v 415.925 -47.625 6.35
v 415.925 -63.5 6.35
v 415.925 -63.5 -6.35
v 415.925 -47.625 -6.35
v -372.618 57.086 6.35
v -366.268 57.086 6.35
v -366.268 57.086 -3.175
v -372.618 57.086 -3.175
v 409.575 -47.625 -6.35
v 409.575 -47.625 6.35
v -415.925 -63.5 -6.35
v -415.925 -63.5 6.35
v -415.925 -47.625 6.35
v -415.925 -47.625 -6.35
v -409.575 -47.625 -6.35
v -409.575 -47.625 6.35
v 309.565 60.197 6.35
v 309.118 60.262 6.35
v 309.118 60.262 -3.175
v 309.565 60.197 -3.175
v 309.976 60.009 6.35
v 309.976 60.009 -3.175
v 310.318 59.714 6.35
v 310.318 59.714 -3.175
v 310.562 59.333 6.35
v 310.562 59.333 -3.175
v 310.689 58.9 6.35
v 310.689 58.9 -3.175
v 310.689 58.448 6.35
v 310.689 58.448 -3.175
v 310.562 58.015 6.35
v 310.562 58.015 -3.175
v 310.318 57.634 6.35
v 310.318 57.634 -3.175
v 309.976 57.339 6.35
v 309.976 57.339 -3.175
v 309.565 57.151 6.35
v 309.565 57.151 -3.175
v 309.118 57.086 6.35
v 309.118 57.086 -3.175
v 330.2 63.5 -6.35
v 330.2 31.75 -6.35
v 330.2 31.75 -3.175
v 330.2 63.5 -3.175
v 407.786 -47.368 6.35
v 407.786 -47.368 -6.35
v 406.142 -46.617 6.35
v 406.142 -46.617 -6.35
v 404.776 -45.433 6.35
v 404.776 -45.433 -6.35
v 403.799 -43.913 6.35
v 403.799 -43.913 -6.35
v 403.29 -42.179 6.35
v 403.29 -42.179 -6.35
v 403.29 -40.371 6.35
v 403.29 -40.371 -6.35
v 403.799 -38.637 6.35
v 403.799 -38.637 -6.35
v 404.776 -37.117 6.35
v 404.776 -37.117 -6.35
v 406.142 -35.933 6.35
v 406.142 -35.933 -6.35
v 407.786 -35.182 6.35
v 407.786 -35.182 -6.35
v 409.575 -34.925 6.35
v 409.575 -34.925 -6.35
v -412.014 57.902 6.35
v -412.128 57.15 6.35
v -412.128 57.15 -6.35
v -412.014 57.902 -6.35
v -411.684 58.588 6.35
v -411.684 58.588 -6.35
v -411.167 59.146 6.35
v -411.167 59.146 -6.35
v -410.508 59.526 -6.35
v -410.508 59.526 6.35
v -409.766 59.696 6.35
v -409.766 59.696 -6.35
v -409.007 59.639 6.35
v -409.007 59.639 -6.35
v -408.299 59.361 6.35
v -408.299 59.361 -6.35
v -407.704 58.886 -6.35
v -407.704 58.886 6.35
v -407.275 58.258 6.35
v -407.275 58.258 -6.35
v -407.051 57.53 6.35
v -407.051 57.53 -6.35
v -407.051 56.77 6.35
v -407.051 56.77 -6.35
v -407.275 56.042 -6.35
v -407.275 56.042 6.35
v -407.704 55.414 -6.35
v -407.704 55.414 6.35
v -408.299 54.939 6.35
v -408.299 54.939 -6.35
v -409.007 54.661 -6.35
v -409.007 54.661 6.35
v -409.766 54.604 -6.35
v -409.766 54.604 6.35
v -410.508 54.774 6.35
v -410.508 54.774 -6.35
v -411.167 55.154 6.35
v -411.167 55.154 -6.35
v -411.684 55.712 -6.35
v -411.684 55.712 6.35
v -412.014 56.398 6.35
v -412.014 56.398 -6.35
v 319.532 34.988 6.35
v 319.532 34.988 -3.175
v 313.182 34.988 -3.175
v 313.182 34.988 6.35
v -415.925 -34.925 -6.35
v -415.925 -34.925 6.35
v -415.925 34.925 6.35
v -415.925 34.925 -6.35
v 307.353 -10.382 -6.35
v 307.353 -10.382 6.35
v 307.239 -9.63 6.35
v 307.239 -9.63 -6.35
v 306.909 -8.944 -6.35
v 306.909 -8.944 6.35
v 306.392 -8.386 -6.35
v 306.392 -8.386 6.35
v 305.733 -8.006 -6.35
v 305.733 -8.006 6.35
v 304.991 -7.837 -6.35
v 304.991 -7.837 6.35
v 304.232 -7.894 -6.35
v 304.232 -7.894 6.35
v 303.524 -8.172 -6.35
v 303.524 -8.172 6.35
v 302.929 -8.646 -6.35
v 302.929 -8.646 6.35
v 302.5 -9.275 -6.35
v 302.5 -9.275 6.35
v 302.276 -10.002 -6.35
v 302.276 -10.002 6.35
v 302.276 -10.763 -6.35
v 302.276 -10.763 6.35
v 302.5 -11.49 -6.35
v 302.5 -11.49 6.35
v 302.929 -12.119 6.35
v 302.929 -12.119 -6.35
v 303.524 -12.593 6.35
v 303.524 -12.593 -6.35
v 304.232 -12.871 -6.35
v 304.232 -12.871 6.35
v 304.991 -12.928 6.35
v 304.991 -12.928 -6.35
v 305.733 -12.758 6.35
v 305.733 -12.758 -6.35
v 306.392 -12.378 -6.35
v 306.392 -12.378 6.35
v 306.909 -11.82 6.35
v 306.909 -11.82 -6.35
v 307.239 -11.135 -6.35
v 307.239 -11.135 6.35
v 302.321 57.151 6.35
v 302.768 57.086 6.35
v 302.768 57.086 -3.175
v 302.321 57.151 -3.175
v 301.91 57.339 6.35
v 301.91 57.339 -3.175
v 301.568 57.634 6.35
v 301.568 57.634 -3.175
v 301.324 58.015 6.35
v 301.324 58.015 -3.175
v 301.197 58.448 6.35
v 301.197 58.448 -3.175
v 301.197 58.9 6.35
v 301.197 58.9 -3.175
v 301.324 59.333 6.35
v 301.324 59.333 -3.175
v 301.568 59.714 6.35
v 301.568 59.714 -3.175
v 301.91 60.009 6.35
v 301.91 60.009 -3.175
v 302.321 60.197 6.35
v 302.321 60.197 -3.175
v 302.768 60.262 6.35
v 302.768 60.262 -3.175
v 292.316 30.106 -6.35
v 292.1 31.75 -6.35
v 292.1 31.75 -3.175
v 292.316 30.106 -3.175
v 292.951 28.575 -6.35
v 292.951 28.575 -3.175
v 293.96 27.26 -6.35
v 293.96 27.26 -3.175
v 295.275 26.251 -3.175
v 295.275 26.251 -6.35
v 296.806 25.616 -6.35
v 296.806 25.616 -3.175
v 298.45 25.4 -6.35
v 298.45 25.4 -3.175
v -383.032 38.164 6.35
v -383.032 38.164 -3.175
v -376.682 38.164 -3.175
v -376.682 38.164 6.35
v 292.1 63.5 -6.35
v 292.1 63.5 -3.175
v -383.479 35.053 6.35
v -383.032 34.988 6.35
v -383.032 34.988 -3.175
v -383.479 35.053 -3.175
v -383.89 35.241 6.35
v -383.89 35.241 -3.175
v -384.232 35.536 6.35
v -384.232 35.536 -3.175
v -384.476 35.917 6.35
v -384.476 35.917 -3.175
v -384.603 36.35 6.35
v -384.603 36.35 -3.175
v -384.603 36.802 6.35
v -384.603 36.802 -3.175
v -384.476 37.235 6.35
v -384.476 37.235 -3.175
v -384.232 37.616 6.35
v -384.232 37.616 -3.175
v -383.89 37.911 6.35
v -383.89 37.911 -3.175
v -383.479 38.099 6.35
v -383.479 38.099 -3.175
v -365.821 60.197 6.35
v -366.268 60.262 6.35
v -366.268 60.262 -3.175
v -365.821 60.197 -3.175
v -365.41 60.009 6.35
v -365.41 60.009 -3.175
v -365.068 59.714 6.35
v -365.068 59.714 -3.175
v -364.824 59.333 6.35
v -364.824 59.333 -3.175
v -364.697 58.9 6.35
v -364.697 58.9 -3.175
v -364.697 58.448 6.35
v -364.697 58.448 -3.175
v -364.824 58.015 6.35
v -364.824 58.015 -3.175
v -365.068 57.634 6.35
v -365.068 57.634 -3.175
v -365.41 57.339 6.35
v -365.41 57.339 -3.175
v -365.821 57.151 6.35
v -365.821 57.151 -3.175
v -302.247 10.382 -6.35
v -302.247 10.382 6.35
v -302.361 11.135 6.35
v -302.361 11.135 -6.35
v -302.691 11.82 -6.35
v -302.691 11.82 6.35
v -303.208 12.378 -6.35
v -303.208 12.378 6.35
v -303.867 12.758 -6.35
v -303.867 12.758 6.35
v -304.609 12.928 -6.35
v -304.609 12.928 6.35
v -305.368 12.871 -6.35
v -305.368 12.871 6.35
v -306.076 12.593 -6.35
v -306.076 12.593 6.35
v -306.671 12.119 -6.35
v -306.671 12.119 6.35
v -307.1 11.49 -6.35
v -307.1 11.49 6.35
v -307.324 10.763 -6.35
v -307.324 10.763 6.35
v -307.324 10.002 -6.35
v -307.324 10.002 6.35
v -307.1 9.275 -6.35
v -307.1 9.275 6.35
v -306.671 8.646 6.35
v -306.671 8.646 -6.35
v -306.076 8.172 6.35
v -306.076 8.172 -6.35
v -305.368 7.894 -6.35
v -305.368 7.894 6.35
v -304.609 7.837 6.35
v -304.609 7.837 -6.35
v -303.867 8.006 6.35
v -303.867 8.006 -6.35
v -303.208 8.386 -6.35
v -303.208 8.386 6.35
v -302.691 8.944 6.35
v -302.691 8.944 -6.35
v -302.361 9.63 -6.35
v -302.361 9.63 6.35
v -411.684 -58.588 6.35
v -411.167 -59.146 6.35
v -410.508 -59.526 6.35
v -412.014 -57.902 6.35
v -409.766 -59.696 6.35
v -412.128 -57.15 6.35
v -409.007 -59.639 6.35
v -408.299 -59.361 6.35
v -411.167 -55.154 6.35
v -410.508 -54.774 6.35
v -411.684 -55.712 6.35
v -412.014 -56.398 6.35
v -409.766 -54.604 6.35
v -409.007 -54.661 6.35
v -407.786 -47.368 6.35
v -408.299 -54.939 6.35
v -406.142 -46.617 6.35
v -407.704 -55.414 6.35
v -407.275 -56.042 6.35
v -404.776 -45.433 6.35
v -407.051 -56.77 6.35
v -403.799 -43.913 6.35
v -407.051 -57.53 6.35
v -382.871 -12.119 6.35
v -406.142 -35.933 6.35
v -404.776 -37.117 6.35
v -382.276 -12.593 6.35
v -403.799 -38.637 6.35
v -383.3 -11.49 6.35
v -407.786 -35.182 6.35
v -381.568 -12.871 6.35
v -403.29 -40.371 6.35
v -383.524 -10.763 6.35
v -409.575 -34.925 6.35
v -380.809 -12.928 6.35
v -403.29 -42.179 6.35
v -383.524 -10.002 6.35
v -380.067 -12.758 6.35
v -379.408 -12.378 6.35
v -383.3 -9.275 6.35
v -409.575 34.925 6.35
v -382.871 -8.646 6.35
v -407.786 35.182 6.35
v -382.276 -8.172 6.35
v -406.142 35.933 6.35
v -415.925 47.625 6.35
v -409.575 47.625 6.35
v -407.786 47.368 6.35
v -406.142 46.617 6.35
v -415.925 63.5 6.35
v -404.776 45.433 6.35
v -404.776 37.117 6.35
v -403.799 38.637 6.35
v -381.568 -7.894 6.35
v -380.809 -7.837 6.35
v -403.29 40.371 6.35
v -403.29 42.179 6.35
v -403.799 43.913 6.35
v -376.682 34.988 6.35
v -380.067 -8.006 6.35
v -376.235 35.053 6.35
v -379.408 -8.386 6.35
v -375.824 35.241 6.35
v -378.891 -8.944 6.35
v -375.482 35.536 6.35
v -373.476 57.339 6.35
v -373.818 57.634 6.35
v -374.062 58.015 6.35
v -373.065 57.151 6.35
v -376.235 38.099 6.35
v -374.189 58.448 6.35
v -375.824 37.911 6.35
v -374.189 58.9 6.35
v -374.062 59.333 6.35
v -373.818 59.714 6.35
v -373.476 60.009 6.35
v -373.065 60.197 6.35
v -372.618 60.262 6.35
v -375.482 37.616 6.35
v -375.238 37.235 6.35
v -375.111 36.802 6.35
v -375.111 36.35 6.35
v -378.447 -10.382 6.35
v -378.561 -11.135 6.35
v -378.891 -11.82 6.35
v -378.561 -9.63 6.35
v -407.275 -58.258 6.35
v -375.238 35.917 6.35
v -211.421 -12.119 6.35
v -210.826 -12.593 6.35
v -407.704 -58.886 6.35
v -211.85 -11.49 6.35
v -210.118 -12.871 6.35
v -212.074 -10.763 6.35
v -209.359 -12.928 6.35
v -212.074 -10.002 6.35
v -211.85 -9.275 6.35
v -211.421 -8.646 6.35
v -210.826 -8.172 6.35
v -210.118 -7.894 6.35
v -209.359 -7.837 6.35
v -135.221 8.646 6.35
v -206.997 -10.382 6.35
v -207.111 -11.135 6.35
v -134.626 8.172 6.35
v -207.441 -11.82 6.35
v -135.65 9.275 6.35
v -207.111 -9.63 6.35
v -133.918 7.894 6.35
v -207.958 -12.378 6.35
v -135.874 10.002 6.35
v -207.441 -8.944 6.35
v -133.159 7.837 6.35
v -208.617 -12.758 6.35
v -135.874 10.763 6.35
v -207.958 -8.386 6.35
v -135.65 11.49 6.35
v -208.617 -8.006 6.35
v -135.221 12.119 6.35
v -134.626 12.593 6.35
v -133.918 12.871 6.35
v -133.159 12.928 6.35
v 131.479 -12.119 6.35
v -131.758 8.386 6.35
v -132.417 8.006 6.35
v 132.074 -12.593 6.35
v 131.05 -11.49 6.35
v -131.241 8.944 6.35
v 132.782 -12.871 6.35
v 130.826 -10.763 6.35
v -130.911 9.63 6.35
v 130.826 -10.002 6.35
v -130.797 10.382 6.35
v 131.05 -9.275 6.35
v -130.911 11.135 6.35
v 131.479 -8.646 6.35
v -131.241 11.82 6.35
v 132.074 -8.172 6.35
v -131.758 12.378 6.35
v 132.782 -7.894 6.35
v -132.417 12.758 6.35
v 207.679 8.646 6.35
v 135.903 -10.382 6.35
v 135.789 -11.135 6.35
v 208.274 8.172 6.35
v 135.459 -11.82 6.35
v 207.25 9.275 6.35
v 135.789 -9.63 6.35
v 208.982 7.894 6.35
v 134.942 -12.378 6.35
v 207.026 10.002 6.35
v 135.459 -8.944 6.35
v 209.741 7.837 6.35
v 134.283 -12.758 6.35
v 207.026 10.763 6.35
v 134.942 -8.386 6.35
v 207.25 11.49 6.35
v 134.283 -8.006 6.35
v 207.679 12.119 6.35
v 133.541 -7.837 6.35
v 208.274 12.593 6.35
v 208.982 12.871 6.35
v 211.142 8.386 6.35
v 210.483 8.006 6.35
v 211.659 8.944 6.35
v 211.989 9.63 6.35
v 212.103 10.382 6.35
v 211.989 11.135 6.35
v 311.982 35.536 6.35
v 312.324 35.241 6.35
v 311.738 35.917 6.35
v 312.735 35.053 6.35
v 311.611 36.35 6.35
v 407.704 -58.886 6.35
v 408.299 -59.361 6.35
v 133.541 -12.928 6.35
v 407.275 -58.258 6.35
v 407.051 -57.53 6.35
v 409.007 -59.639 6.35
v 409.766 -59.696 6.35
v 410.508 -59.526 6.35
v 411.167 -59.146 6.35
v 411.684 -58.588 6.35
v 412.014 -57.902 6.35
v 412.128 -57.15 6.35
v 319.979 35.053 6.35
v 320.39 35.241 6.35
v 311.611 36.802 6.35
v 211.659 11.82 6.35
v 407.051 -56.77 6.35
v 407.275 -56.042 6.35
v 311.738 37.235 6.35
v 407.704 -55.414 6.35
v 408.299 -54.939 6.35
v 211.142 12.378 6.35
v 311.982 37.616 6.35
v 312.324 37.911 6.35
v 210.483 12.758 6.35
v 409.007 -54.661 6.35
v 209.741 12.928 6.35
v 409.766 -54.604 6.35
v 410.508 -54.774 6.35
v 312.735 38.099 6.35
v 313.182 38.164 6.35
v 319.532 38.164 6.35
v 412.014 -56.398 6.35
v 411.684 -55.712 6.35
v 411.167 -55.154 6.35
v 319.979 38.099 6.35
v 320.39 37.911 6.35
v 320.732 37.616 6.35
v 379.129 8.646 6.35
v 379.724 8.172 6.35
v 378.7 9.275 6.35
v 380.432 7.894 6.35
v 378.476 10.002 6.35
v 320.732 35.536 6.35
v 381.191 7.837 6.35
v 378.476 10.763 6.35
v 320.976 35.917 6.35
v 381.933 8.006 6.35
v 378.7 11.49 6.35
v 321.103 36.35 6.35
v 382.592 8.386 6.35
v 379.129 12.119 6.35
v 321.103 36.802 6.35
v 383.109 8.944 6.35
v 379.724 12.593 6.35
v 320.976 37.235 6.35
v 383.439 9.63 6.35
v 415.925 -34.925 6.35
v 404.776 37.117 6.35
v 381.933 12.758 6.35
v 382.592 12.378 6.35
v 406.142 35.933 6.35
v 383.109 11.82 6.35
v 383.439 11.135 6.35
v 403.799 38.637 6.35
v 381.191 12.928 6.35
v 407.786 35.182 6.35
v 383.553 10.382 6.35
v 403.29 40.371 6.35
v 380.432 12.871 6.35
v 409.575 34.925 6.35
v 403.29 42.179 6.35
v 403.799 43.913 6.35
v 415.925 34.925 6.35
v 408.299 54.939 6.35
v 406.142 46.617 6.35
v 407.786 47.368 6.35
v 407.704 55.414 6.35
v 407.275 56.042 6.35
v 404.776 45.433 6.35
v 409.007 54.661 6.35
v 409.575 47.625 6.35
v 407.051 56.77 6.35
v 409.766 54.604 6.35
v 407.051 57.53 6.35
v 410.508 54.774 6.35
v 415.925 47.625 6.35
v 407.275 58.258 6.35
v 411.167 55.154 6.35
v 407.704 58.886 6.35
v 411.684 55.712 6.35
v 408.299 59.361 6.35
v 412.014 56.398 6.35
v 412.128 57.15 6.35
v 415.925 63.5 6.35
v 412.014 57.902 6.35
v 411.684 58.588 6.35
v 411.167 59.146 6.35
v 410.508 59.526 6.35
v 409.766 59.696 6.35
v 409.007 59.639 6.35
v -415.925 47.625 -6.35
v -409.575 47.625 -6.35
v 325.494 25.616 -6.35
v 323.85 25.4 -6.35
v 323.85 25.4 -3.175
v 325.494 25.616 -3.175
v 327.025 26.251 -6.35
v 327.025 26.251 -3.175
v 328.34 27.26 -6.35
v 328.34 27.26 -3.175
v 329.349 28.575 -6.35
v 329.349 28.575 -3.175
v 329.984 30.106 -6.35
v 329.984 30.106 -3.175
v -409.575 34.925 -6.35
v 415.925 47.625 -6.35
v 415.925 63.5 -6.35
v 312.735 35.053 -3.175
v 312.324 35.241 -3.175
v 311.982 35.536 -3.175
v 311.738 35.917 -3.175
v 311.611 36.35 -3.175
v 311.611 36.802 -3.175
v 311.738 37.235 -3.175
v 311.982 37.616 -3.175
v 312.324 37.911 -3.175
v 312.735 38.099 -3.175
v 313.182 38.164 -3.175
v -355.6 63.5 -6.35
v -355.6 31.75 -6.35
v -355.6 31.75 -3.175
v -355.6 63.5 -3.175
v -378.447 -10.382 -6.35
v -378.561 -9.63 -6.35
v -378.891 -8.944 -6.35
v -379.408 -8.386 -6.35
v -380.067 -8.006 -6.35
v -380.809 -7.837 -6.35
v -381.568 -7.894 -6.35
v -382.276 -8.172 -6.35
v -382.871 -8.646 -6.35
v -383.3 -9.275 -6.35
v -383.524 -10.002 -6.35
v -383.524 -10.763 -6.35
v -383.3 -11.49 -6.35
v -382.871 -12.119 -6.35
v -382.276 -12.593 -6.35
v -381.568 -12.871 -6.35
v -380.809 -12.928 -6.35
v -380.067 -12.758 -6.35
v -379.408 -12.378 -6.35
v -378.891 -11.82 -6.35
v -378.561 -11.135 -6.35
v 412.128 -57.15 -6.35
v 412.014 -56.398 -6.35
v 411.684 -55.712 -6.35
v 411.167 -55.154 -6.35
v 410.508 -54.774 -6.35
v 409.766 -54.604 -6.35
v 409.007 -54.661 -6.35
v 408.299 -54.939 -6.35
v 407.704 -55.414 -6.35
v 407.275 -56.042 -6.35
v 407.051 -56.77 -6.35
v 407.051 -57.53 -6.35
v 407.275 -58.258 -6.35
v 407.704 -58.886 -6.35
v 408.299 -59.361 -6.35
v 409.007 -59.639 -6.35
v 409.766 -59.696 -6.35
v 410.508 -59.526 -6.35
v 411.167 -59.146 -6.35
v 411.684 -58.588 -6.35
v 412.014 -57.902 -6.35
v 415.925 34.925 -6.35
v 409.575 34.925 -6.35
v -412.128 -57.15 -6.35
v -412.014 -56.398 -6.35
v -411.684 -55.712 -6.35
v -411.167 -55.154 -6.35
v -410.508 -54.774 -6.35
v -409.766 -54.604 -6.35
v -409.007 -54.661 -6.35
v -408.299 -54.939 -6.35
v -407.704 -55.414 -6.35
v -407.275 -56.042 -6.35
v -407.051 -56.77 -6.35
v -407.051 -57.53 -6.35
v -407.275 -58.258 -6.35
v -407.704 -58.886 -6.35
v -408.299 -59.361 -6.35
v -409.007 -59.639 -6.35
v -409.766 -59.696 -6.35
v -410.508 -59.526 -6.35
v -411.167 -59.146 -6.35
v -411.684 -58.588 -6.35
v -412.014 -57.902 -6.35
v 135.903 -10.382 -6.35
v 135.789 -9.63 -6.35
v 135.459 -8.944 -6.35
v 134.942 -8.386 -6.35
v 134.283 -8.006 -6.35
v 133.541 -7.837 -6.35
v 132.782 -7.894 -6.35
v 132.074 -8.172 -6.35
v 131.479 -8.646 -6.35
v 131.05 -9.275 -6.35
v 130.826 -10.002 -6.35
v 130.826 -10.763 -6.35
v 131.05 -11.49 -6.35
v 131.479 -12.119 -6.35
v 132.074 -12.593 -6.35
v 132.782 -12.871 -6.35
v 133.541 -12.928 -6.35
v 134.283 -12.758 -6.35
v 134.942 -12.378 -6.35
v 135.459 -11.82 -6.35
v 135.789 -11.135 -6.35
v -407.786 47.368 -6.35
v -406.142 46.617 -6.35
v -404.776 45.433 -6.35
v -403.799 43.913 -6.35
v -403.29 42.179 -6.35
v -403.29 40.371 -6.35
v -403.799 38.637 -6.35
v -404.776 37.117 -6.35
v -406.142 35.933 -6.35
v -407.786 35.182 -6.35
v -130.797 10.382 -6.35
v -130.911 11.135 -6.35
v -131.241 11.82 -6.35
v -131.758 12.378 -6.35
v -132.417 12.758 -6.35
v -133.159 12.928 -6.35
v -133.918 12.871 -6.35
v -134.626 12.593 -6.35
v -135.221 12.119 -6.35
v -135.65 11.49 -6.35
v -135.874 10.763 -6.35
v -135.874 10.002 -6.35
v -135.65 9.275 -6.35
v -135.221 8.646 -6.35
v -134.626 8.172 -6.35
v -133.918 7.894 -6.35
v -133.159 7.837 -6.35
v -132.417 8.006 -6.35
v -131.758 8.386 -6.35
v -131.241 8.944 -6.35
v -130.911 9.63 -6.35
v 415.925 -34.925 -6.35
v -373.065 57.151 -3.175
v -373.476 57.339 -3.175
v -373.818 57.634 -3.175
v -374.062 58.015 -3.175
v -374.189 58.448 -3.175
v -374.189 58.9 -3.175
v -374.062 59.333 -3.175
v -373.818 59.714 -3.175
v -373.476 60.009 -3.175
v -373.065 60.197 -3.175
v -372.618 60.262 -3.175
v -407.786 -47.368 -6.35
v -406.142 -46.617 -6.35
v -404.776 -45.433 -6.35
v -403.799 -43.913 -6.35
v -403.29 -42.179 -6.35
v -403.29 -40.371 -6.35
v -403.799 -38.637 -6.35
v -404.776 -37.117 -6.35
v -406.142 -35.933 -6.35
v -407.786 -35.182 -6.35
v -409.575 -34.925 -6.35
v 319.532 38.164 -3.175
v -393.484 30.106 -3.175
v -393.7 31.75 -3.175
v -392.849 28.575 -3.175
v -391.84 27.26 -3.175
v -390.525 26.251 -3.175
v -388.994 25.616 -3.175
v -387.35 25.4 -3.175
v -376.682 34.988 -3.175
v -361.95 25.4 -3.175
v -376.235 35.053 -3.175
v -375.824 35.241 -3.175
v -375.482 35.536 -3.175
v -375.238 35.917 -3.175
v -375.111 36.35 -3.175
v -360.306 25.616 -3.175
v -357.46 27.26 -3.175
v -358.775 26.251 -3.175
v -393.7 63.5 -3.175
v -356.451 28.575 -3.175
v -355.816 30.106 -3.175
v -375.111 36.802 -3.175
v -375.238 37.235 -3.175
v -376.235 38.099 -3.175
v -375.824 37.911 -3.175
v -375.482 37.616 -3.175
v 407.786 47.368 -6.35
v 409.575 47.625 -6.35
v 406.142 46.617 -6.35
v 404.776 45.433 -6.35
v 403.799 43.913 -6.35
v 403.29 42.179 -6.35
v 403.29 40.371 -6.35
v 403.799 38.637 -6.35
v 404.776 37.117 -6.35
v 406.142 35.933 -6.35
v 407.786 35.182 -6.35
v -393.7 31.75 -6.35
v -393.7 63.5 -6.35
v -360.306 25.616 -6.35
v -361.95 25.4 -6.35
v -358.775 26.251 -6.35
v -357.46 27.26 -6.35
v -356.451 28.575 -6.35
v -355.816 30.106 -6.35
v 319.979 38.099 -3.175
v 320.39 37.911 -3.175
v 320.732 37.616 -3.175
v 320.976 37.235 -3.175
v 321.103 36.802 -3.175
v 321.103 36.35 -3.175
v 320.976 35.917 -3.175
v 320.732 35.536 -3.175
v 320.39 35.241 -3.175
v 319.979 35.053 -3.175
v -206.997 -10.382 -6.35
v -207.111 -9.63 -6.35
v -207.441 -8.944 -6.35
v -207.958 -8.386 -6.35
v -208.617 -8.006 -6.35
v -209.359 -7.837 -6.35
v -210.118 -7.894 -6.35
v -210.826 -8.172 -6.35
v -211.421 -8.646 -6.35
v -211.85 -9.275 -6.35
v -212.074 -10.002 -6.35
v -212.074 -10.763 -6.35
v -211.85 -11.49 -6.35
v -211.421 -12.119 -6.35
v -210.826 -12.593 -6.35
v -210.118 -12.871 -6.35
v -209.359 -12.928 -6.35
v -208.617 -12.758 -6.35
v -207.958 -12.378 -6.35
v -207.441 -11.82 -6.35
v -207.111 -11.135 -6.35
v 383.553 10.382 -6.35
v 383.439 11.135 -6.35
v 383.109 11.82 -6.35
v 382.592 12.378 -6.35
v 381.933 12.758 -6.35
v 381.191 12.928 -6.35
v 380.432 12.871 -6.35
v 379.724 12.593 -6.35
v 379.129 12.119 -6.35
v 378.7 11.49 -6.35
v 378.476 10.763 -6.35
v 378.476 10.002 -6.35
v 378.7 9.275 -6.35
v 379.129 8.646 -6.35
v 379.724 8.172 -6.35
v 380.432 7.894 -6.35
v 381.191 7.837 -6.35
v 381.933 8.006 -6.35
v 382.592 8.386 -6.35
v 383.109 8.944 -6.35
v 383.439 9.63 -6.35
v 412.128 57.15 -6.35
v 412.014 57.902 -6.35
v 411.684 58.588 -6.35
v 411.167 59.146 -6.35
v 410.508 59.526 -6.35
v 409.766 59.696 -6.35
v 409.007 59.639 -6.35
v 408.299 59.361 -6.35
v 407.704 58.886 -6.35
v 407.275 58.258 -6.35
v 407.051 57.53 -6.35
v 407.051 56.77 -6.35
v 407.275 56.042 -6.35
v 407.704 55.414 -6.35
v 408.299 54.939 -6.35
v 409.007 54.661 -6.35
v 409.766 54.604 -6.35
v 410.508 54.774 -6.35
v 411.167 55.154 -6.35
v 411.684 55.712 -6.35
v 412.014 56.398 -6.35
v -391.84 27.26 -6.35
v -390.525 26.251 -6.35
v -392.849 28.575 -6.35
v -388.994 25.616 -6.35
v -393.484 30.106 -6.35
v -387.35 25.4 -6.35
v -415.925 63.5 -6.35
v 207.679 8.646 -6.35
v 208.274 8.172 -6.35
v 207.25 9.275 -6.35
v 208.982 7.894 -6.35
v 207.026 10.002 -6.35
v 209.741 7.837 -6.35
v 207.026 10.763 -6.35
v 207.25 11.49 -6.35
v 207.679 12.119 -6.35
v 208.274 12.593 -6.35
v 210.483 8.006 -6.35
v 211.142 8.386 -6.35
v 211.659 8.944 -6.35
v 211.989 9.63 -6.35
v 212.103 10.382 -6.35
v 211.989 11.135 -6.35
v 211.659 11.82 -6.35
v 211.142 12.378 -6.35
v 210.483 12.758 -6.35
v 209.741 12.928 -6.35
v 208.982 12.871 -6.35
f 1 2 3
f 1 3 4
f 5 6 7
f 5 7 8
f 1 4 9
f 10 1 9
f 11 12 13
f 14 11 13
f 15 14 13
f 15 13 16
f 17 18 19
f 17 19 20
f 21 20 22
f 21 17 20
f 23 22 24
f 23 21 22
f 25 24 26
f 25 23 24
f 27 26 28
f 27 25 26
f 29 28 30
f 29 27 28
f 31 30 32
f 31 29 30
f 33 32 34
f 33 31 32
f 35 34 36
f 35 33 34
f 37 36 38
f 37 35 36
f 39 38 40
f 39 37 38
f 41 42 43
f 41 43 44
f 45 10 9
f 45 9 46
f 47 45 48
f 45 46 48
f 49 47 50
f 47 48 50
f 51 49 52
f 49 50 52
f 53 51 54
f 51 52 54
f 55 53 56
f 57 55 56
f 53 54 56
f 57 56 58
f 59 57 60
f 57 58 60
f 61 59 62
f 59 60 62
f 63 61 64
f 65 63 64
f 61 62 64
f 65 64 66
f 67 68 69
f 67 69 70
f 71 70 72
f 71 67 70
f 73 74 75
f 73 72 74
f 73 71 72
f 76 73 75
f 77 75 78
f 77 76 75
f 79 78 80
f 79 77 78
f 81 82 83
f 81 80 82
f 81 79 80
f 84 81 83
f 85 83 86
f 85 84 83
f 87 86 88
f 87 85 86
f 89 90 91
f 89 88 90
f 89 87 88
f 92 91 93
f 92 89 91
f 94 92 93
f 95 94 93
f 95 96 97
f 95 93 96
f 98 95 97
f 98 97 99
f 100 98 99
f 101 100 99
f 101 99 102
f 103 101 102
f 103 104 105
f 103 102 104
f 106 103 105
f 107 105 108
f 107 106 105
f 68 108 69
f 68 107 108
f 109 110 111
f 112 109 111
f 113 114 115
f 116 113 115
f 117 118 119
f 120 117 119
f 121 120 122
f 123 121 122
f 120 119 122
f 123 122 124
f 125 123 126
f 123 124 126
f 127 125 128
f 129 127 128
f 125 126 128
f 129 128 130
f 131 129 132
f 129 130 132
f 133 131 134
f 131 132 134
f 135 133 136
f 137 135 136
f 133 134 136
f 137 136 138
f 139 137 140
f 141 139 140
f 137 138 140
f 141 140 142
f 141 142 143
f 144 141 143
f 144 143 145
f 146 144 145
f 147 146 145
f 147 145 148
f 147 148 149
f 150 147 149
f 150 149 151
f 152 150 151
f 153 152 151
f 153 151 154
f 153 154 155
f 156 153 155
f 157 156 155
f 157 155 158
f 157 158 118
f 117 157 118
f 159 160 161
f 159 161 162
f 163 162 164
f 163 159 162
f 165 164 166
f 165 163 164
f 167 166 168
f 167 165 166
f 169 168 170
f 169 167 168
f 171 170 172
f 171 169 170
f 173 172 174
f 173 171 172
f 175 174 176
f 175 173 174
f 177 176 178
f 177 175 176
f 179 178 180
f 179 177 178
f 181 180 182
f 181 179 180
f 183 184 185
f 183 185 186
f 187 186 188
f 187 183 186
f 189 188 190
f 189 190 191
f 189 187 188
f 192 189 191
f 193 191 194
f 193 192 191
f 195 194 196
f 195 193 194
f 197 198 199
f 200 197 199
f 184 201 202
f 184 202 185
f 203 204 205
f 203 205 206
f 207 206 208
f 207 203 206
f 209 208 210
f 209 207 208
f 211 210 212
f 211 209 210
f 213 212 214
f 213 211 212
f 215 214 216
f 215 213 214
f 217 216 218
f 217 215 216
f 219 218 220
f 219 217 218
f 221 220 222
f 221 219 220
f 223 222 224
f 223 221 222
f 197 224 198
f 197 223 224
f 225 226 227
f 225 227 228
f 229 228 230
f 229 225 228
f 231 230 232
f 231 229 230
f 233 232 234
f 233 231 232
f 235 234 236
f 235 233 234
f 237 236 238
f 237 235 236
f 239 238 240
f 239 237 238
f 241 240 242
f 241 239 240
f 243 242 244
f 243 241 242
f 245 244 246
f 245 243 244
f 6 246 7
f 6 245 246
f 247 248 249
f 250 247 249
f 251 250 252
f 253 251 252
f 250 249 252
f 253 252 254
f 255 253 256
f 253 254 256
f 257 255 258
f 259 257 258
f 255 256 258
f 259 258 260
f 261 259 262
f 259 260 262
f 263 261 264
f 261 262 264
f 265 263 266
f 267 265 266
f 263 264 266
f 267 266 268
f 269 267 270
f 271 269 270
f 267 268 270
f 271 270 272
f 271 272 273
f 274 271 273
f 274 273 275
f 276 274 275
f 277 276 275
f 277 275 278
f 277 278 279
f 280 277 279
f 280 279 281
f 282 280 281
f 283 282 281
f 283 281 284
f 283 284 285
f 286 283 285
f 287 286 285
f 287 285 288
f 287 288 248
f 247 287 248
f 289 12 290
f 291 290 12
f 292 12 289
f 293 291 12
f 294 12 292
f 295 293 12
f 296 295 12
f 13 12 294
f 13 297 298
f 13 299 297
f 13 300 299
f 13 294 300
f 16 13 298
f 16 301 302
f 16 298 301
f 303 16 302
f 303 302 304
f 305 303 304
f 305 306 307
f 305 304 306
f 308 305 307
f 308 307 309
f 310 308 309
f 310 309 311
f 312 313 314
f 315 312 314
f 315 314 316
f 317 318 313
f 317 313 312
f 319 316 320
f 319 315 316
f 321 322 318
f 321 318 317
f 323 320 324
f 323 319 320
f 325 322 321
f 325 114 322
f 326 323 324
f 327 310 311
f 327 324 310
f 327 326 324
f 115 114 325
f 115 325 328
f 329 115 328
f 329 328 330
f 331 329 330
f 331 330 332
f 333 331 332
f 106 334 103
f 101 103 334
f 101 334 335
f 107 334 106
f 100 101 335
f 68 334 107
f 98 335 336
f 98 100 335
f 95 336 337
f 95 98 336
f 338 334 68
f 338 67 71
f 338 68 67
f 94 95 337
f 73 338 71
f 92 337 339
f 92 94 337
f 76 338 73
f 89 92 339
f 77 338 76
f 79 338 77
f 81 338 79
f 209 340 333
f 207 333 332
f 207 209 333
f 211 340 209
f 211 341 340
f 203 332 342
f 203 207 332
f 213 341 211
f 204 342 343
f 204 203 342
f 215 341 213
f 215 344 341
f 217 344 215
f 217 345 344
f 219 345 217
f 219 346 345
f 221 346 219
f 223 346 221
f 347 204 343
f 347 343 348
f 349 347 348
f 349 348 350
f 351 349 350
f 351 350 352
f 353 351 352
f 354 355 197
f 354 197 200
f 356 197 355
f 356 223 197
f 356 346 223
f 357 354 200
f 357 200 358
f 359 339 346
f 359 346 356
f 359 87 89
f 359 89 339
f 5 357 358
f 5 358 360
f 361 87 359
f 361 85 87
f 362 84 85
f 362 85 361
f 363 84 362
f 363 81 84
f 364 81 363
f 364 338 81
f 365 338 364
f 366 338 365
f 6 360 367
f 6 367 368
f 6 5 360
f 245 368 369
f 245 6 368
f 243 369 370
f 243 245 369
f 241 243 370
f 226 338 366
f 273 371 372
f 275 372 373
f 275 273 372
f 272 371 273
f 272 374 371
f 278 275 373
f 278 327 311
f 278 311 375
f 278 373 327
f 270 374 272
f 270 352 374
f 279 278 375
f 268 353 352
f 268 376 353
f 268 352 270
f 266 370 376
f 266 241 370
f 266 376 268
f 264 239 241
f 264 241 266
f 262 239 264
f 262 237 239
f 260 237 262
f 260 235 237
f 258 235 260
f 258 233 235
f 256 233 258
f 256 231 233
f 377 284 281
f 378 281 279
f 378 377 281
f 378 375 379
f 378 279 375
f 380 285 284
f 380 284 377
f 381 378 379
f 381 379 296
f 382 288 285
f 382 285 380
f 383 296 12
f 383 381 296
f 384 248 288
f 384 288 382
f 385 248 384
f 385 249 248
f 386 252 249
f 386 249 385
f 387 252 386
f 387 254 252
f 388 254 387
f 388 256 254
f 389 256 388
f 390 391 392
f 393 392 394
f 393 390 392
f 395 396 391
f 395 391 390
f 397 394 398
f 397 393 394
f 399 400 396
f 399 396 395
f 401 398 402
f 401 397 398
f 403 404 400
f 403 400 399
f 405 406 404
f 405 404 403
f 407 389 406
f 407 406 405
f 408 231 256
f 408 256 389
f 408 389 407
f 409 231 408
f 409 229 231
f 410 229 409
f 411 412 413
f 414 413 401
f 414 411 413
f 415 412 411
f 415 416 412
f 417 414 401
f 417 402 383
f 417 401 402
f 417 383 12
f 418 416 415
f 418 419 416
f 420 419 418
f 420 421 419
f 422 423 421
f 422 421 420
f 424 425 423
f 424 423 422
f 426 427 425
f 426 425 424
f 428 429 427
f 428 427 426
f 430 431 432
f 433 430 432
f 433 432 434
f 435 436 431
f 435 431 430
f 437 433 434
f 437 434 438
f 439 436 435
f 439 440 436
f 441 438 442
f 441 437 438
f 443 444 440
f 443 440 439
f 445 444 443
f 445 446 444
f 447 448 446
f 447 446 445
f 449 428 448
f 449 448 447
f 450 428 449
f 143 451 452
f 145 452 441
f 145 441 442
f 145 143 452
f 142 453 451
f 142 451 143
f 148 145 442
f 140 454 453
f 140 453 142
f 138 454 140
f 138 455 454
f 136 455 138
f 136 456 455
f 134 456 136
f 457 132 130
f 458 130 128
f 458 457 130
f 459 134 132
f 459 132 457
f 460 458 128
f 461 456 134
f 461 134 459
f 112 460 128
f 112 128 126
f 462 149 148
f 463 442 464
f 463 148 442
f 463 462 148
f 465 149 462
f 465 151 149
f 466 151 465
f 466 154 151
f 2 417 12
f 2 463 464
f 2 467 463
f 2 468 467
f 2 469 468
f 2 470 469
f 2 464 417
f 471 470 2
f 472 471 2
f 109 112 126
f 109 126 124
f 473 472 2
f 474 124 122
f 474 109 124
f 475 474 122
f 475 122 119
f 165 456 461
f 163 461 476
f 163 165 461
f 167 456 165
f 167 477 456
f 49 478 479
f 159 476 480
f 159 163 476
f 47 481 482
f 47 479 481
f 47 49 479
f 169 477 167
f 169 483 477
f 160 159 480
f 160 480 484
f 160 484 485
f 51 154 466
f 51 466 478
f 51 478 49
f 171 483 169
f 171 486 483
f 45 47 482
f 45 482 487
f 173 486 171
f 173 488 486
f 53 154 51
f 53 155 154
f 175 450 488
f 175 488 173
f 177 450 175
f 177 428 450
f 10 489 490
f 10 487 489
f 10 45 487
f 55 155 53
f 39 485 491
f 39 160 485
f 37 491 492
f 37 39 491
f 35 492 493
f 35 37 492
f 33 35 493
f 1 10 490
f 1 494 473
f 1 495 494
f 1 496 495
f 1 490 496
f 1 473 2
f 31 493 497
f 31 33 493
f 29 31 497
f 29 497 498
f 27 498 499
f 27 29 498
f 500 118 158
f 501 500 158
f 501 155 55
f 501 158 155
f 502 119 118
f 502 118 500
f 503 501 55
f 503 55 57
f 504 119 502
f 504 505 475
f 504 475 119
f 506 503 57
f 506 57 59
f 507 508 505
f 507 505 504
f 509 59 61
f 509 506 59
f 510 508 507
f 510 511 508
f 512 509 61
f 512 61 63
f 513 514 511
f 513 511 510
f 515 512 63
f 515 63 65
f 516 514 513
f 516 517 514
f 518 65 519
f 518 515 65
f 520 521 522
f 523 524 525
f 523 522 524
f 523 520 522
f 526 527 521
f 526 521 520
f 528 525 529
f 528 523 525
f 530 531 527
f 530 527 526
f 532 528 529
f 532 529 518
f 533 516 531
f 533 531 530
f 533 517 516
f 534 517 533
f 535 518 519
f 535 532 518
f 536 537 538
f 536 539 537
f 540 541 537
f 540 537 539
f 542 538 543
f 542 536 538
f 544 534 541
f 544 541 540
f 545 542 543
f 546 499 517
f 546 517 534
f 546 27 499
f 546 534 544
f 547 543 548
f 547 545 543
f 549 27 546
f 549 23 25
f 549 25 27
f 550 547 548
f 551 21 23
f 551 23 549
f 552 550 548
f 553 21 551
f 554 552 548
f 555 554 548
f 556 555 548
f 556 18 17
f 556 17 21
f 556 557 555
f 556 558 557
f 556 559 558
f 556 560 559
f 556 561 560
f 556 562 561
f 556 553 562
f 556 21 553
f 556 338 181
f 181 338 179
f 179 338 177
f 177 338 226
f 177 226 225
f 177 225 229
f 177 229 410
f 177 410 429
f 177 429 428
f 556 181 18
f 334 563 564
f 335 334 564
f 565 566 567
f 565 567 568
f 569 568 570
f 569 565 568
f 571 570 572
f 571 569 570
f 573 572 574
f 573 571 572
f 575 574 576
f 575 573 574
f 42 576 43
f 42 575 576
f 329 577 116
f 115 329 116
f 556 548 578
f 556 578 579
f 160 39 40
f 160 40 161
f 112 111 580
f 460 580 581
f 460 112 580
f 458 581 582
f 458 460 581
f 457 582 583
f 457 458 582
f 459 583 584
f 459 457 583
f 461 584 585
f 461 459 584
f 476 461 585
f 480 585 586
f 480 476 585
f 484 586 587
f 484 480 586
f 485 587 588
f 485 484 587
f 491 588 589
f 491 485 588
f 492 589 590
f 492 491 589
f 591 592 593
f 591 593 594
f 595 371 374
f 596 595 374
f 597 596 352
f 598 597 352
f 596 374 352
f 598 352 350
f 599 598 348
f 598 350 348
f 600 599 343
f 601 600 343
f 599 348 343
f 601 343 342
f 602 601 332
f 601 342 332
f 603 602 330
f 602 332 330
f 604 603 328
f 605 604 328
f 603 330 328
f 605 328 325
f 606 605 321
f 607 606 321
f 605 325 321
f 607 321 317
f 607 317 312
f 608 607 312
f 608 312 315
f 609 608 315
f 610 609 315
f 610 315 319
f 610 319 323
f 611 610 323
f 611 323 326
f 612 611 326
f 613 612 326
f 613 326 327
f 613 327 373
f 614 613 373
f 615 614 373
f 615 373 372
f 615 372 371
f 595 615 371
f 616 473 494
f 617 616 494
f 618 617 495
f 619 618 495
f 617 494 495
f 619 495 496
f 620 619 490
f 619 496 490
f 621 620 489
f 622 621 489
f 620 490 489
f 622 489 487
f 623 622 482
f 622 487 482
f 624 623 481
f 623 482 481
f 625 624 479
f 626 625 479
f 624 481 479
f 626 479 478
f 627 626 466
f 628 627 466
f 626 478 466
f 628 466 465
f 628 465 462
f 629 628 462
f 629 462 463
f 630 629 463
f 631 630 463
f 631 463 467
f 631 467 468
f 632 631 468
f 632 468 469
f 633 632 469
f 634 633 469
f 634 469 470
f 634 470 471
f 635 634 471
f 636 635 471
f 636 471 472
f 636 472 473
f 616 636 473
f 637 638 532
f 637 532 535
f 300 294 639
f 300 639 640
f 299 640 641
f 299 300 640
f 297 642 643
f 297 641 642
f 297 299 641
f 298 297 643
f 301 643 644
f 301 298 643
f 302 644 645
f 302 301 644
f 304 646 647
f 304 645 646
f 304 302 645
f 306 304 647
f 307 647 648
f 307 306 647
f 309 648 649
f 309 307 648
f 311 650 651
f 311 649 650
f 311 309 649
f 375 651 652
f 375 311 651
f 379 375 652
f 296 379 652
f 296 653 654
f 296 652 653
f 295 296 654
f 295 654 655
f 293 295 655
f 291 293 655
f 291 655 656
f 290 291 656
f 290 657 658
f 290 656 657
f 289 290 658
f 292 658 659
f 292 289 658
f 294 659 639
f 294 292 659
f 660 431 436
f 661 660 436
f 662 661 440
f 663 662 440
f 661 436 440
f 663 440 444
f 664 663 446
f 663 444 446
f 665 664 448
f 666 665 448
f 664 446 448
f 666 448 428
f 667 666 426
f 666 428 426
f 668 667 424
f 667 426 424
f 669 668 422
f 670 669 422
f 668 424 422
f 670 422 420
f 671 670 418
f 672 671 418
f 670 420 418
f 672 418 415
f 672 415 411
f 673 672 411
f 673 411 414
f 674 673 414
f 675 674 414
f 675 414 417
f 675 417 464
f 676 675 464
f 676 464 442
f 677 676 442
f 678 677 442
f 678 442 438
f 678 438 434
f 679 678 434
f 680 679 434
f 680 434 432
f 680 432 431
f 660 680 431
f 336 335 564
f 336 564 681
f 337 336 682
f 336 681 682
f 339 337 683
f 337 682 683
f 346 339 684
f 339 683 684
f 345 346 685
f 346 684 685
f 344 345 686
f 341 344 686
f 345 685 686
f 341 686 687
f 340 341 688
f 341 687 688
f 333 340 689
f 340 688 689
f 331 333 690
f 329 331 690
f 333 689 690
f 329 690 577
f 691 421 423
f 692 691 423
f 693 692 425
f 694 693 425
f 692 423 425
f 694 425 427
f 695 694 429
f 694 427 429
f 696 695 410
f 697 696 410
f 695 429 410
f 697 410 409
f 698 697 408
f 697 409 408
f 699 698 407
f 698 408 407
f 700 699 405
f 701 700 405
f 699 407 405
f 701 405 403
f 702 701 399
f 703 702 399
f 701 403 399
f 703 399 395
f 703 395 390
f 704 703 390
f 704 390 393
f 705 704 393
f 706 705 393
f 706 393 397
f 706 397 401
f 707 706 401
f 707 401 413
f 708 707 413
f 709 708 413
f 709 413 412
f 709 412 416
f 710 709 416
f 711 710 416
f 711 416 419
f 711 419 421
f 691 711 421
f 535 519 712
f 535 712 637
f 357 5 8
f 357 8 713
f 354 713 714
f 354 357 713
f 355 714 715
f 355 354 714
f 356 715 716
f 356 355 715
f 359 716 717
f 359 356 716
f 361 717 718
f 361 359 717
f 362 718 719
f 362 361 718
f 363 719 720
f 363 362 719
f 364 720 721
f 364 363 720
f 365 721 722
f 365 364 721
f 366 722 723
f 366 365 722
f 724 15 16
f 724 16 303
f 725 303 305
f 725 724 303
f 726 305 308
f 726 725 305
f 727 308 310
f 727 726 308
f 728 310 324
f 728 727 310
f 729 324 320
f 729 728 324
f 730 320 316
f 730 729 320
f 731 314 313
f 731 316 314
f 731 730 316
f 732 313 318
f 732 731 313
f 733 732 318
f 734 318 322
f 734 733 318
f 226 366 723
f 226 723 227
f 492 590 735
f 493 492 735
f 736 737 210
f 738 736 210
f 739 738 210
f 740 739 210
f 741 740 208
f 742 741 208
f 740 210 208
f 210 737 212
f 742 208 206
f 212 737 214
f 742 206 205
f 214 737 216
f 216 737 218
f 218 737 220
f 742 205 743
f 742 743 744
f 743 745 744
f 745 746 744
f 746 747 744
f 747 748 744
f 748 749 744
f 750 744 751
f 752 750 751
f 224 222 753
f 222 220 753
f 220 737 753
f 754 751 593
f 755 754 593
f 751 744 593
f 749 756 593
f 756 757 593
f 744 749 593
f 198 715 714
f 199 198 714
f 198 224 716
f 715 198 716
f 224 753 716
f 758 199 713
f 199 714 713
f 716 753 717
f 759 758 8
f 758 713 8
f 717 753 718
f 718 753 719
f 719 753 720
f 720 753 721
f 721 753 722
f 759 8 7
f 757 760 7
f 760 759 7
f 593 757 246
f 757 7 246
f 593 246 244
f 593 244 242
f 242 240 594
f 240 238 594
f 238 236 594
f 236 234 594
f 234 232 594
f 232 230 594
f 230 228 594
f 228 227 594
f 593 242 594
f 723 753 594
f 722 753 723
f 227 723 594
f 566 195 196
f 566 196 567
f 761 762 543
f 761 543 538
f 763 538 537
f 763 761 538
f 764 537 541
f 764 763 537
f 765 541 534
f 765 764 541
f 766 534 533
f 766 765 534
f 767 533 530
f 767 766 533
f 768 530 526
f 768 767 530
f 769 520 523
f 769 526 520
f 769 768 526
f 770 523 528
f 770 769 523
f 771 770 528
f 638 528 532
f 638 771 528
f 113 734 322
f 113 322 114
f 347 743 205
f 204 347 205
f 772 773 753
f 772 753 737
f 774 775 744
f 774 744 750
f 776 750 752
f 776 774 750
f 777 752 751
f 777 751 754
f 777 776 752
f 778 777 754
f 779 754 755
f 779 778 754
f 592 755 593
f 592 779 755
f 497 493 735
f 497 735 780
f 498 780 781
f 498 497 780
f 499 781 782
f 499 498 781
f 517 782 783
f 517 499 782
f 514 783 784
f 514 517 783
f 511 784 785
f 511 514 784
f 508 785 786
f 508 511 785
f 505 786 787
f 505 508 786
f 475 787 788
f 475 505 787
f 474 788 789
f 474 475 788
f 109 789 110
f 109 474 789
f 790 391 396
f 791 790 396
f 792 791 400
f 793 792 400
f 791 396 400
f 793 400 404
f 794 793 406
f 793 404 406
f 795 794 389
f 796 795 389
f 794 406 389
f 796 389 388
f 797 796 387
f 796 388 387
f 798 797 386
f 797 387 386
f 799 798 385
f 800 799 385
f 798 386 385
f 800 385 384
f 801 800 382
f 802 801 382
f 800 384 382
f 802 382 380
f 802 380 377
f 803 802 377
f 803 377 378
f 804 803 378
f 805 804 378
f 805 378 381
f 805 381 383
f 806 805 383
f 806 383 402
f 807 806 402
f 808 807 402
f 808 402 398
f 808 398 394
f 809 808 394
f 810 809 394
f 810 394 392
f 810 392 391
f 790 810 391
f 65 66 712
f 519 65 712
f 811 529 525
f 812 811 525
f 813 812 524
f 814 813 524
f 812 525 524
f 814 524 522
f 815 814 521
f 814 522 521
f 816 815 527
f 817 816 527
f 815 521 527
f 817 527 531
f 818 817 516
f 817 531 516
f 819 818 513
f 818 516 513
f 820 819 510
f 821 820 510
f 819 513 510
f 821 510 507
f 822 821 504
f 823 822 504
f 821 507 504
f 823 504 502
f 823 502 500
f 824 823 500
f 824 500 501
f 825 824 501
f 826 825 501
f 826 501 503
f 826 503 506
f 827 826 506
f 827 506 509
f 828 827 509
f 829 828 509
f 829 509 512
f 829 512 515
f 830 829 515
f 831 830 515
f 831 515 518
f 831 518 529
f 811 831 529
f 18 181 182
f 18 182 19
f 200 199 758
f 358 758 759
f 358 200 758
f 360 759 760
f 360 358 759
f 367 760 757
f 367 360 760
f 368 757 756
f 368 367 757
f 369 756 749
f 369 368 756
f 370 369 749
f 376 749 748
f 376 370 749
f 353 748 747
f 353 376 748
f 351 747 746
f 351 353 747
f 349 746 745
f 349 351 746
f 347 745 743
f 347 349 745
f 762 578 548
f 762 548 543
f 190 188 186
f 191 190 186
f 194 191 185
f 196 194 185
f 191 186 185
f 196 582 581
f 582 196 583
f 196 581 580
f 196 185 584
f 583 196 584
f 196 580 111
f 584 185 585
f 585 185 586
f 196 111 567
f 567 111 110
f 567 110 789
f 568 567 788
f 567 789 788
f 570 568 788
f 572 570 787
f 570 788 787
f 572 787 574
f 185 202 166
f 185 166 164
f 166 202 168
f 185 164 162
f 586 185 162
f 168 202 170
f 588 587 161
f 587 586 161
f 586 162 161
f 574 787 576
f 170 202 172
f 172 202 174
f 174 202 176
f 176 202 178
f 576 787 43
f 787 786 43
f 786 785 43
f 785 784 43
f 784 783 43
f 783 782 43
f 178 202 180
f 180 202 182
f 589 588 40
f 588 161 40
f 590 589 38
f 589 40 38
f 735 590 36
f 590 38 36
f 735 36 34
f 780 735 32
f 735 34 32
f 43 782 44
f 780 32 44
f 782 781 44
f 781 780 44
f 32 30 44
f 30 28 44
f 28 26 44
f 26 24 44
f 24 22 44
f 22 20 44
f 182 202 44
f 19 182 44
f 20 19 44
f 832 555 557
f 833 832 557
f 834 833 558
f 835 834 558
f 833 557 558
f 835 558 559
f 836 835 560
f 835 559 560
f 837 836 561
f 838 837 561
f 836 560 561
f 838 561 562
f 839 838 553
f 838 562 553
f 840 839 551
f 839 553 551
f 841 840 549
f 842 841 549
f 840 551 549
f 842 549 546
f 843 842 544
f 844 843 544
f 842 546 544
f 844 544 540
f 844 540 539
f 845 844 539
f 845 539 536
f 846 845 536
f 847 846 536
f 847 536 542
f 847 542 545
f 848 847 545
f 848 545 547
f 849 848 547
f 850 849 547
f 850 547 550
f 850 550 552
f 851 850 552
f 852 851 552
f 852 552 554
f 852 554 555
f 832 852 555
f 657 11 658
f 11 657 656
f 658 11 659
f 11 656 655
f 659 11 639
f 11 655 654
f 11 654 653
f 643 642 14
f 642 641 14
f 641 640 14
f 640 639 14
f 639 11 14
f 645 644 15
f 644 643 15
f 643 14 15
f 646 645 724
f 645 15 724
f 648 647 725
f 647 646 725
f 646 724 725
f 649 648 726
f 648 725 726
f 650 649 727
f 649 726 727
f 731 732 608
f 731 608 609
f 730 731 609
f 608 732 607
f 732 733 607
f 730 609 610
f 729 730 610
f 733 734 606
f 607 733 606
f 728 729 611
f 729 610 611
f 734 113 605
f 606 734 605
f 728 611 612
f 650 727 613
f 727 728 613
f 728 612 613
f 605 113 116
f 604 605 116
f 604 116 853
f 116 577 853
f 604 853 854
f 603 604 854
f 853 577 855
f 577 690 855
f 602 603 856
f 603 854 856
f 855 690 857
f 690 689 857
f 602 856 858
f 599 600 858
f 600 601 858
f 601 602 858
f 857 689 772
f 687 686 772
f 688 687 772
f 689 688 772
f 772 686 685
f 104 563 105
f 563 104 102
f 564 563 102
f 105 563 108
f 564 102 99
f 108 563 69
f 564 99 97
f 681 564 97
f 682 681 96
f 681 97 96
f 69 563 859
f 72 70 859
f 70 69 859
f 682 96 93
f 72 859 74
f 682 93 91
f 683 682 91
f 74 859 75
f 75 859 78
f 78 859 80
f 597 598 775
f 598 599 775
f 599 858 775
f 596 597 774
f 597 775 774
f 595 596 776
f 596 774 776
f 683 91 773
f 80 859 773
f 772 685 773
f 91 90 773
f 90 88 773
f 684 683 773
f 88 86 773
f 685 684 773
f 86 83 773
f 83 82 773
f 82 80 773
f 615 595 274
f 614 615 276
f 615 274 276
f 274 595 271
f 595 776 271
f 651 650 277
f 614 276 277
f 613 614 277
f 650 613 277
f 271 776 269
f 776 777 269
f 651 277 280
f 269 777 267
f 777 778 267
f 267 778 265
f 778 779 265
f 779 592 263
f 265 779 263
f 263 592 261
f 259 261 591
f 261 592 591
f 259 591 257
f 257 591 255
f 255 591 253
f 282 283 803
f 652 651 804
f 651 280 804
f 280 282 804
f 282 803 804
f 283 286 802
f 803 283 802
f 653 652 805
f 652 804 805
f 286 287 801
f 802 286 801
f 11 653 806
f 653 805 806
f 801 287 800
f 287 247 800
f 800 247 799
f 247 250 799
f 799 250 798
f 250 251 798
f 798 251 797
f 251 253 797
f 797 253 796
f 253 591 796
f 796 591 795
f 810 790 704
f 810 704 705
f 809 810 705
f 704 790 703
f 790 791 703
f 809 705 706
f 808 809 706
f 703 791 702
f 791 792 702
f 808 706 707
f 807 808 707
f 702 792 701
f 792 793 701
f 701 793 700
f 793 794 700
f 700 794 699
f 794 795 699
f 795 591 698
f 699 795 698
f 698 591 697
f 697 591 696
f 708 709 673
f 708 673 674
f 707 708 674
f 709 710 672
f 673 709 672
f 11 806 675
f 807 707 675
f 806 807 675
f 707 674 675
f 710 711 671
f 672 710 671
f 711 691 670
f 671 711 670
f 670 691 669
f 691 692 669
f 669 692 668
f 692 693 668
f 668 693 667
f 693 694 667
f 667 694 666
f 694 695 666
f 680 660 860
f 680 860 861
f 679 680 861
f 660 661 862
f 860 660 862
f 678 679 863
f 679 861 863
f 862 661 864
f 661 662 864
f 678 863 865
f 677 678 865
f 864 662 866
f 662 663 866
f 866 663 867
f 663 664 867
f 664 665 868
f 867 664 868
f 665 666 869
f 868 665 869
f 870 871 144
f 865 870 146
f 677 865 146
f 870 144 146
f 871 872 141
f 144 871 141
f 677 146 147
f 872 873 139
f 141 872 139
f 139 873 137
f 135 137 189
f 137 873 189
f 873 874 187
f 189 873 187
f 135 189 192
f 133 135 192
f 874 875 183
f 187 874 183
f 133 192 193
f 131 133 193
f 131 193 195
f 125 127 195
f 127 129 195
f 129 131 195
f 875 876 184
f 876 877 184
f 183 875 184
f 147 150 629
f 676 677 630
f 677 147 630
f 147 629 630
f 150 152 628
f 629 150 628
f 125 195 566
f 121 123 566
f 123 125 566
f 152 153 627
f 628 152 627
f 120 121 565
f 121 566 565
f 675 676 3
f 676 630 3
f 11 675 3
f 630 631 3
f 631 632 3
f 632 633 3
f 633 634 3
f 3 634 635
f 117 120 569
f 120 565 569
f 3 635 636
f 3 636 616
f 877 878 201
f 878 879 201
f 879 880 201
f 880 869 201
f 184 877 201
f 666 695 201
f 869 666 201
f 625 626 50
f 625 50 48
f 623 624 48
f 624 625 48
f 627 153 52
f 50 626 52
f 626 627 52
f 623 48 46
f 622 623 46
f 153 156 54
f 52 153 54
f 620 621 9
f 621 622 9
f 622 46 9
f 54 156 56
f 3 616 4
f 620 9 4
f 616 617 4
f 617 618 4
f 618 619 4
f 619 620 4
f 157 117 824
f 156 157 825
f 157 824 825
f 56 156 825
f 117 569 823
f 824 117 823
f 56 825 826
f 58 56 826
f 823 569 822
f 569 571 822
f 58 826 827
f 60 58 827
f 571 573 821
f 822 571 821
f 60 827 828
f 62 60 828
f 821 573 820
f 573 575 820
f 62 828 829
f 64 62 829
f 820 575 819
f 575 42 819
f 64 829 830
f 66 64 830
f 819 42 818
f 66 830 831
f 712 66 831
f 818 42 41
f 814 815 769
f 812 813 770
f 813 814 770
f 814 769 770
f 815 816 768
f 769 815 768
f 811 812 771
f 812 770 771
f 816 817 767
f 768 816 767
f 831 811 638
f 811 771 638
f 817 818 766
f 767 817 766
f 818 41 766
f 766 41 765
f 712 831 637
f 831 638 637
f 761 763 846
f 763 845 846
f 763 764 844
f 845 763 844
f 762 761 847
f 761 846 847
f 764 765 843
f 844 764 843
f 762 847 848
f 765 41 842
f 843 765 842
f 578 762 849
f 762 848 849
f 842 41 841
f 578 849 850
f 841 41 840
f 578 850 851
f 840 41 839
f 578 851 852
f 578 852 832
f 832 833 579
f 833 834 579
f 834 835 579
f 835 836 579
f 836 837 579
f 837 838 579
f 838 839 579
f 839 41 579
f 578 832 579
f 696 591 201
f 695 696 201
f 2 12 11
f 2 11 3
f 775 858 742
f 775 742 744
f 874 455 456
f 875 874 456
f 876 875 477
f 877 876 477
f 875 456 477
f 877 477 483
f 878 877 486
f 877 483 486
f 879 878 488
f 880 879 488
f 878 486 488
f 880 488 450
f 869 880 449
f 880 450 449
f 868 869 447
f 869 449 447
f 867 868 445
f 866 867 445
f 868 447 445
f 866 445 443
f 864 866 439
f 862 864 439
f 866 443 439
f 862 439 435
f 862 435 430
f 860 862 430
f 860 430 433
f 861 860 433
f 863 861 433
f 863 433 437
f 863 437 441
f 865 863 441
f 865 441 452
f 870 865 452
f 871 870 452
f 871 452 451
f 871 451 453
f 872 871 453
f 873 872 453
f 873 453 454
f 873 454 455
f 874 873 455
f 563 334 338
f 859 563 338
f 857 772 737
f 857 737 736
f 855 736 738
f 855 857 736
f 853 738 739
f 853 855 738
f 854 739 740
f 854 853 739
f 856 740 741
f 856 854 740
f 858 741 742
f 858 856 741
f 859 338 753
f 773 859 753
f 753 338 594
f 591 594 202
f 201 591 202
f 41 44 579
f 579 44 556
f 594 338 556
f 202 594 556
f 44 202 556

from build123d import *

# Parameters (mm, degrees)
SKETCH1_W                         = 831.85
SKETCH1_H                         = 127
BOSS_EXTRUDE1_DEPTH               = 6.35
F_10_CLEARANCE_HOLE1_D            = 5.1054
TAPPED_HOLE_FOR_10_32_HELICOIL1_D = 5.1054
LPATTERN1_COUNT                   = 5
LPATTERN1_PITCH                   = 171.45
CUT_EXTRUDE1_DEPTH                = 421.936035075
CUT_EXTRUDE3_REACH                = 422.936
CUT_EXTRUDE4_DEPTH                = 3.175


with BuildPart() as part:
    # Sketch1 → Boss-Extrude1 (new, symmetric)
    with BuildSketch(Plane.XY):
        Rectangle(SKETCH1_W, SKETCH1_H)
    extrude(amount=BOSS_EXTRUDE1_DEPTH, both=True)

    # #10 Clearance Hole1 (through all)
    with Locations(Plane(origin=(0, 0, -6.35), x_dir=(-1, 0, 0), z_dir=(0, 0, -1))):
        with Locations((-409.575, 57.15), (-409.575, -57.15)):
            f_10_clearance_hole1 = Hole(F_10_CLEARANCE_HOLE1_D / 2)

    # Tapped Hole for #10-32 Helicoil1 (through all)
    with Locations(Plane(origin=(0, 0, -6.35), x_dir=(-1, 0, 0), z_dir=(0, 0, -1))):
        with Locations((-381, 10.38225), (-304.8, -10.38225)):
            tapped_hole_for_10_32_helicoil1 = Hole(TAPPED_HOLE_FOR_10_32_HELICOIL1_D / 2)

    # LPattern1: Tapped Hole for #10-32 Helicoil1 ×5, 1 skipped
    with Locations(*[(-i * LPATTERN1_PITCH, 0, 0) for i in range(1, LPATTERN1_COUNT) if i not in (2,)]):
        add(tapped_hole_for_10_32_helicoil1, mode=Mode.SUBTRACT)

    # Sketch9 → Cut-Extrude1 (cut, through all)
    with BuildSketch(Plane(origin=(0, 0, -6.35), x_dir=(-1, 0, 0), z_dir=(0, 0, -1))):
        with BuildLine():
            Line((-422.275, 47.625), (-409.575, 47.625))
            ThreePointArc((-409.575, 47.625), (-403.225, 41.275), (-409.575, 34.925))
            Line((-409.575, 34.925), (-422.275, 34.925))
            ThreePointArc((-422.275, 34.925), (-428.625, 41.275), (-422.275, 47.625))
        make_face()
        with BuildLine():
            Line((-422.275, -47.625), (-409.575, -47.625))
            ThreePointArc((-409.575, -47.625), (-403.225, -41.275), (-409.575, -34.925))
            Line((-409.575, -34.925), (-422.275, -34.925))
            ThreePointArc((-422.275, -34.925), (-428.625, -41.275), (-422.275, -47.625))
        make_face()
    cut_extrude1 = extrude(amount=-CUT_EXTRUDE1_DEPTH, mode=Mode.SUBTRACT)

    # Mirror1: #10 Clearance Hole1, Cut-Extrude1 across plane
    add(f_10_clearance_hole1.mirror(Plane(origin=(0, 0, 0), x_dir=(0, 0, 1), z_dir=(1, 0, 0))), mode=Mode.SUBTRACT)
    add(cut_extrude1.mirror(Plane(origin=(0, 0, 0), x_dir=(0, 0, 1), z_dir=(1, 0, 0))), mode=Mode.SUBTRACT)

    # Sketch13 → Cut-Extrude3 (cut, up to next)
    with BuildSketch(Plane.XY.offset(6.35), mode=Mode.PRIVATE) as cut_extrude3_sk1:
        with BuildLine():
            Line((-372.618, 60.2615), (-366.268, 60.2615))
            ThreePointArc((-366.268, 60.2615), (-364.6805, 58.674), (-366.268, 57.0865))
            Line((-366.268, 57.0865), (-372.618, 57.0865))
            ThreePointArc((-372.618, 57.0865), (-374.2055, 58.674), (-372.618, 60.2615))
        make_face()
    cut_extrude3_tool1 = extrude(cut_extrude3_sk1.sketch, amount=-CUT_EXTRUDE3_REACH, mode=Mode.PRIVATE) & part.part
    # Sketch13 → Cut-Extrude3 (cut, up to next)
    with BuildSketch(Plane.XY.offset(6.35), mode=Mode.PRIVATE) as cut_extrude3_sk2:
        with BuildLine():
            Line((-383.032, 38.1635), (-376.682, 38.1635))
            ThreePointArc((-376.682, 38.1635), (-375.0945, 36.576), (-376.682, 34.9885))
            Line((-376.682, 34.9885), (-383.032, 34.9885))
            ThreePointArc((-383.032, 34.9885), (-384.6195, 36.576), (-383.032, 38.1635))
        make_face()
    cut_extrude3_tool2 = extrude(cut_extrude3_sk2.sketch, amount=-CUT_EXTRUDE3_REACH, mode=Mode.PRIVATE) & part.part
    # Sketch13 → Cut-Extrude3 (cut, up to next)
    with BuildSketch(Plane.XY.offset(6.35), mode=Mode.PRIVATE) as cut_extrude3_sk3:
        with BuildLine():
            Line((302.768, 60.2615), (309.118, 60.2615))
            ThreePointArc((309.118, 60.2615), (310.7055, 58.674), (309.118, 57.0865))
            Line((309.118, 57.0865), (302.768, 57.0865))
            ThreePointArc((302.768, 57.0865), (301.1805, 58.674), (302.768, 60.2615))
        make_face()
    cut_extrude3_tool3 = extrude(cut_extrude3_sk3.sketch, amount=-CUT_EXTRUDE3_REACH, mode=Mode.PRIVATE) & part.part
    # Sketch13 → Cut-Extrude3 (cut, up to next)
    with BuildSketch(Plane.XY.offset(6.35), mode=Mode.PRIVATE) as cut_extrude3_sk4:
        with BuildLine():
            Line((313.182, 38.1635), (319.532, 38.1635))
            ThreePointArc((319.532, 38.1635), (321.1195, 36.576), (319.532, 34.9885))
            Line((319.532, 34.9885), (313.182, 34.9885))
            ThreePointArc((313.182, 34.9885), (311.5945, 36.576), (313.182, 38.1635))
        make_face()
    cut_extrude3_tool4 = extrude(cut_extrude3_sk4.sketch, amount=-CUT_EXTRUDE3_REACH, mode=Mode.PRIVATE) & part.part
    add(cut_extrude3_tool1.solids().sort_by_distance((-369.443, 58.674, 6.35))[0], mode=Mode.SUBTRACT)
    add(cut_extrude3_tool2.solids().sort_by_distance((-379.857, 36.576, 6.35))[0], mode=Mode.SUBTRACT)
    add(cut_extrude3_tool3.solids().sort_by_distance((305.943, 58.674, 6.35))[0], mode=Mode.SUBTRACT)
    add(cut_extrude3_tool4.solids().sort_by_distance((316.357, 36.576, 6.35))[0], mode=Mode.SUBTRACT)

    # Sketch14 → Cut-Extrude4 (cut)
    with BuildSketch(Plane(origin=(0, 0, -6.35), x_dir=(-1, 0, 0), z_dir=(0, 0, -1))):
        with BuildLine():
            Line((-330.2, 63.5), (-292.1, 63.5))
            Line((-292.1, 63.5), (-292.1, 31.75))
            ThreePointArc((-292.1, 31.75), (-293.959871939, 27.259871939), (-298.45, 25.4))
            Line((-298.45, 25.4), (-323.85, 25.4))
            ThreePointArc((-323.85, 25.4), (-328.340128061, 27.259871939), (-330.2, 31.75))
            Line((-330.2, 31.75), (-330.2, 63.5))
        make_face()
        with BuildLine():
            Line((355.6, 63.5), (393.7, 63.5))
            Line((393.7, 63.5), (393.7, 31.75))
            ThreePointArc((393.7, 31.75), (391.840128061, 27.259871939), (387.35, 25.4))
            Line((387.35, 25.4), (361.95, 25.4))
            ThreePointArc((361.95, 25.4), (357.459871939, 27.259871939), (355.6, 31.75))
            Line((355.6, 31.75), (355.6, 63.5))
        make_face()
    extrude(amount=-CUT_EXTRUDE4_DEPTH, mode=Mode.SUBTRACT)


solid = part.part
